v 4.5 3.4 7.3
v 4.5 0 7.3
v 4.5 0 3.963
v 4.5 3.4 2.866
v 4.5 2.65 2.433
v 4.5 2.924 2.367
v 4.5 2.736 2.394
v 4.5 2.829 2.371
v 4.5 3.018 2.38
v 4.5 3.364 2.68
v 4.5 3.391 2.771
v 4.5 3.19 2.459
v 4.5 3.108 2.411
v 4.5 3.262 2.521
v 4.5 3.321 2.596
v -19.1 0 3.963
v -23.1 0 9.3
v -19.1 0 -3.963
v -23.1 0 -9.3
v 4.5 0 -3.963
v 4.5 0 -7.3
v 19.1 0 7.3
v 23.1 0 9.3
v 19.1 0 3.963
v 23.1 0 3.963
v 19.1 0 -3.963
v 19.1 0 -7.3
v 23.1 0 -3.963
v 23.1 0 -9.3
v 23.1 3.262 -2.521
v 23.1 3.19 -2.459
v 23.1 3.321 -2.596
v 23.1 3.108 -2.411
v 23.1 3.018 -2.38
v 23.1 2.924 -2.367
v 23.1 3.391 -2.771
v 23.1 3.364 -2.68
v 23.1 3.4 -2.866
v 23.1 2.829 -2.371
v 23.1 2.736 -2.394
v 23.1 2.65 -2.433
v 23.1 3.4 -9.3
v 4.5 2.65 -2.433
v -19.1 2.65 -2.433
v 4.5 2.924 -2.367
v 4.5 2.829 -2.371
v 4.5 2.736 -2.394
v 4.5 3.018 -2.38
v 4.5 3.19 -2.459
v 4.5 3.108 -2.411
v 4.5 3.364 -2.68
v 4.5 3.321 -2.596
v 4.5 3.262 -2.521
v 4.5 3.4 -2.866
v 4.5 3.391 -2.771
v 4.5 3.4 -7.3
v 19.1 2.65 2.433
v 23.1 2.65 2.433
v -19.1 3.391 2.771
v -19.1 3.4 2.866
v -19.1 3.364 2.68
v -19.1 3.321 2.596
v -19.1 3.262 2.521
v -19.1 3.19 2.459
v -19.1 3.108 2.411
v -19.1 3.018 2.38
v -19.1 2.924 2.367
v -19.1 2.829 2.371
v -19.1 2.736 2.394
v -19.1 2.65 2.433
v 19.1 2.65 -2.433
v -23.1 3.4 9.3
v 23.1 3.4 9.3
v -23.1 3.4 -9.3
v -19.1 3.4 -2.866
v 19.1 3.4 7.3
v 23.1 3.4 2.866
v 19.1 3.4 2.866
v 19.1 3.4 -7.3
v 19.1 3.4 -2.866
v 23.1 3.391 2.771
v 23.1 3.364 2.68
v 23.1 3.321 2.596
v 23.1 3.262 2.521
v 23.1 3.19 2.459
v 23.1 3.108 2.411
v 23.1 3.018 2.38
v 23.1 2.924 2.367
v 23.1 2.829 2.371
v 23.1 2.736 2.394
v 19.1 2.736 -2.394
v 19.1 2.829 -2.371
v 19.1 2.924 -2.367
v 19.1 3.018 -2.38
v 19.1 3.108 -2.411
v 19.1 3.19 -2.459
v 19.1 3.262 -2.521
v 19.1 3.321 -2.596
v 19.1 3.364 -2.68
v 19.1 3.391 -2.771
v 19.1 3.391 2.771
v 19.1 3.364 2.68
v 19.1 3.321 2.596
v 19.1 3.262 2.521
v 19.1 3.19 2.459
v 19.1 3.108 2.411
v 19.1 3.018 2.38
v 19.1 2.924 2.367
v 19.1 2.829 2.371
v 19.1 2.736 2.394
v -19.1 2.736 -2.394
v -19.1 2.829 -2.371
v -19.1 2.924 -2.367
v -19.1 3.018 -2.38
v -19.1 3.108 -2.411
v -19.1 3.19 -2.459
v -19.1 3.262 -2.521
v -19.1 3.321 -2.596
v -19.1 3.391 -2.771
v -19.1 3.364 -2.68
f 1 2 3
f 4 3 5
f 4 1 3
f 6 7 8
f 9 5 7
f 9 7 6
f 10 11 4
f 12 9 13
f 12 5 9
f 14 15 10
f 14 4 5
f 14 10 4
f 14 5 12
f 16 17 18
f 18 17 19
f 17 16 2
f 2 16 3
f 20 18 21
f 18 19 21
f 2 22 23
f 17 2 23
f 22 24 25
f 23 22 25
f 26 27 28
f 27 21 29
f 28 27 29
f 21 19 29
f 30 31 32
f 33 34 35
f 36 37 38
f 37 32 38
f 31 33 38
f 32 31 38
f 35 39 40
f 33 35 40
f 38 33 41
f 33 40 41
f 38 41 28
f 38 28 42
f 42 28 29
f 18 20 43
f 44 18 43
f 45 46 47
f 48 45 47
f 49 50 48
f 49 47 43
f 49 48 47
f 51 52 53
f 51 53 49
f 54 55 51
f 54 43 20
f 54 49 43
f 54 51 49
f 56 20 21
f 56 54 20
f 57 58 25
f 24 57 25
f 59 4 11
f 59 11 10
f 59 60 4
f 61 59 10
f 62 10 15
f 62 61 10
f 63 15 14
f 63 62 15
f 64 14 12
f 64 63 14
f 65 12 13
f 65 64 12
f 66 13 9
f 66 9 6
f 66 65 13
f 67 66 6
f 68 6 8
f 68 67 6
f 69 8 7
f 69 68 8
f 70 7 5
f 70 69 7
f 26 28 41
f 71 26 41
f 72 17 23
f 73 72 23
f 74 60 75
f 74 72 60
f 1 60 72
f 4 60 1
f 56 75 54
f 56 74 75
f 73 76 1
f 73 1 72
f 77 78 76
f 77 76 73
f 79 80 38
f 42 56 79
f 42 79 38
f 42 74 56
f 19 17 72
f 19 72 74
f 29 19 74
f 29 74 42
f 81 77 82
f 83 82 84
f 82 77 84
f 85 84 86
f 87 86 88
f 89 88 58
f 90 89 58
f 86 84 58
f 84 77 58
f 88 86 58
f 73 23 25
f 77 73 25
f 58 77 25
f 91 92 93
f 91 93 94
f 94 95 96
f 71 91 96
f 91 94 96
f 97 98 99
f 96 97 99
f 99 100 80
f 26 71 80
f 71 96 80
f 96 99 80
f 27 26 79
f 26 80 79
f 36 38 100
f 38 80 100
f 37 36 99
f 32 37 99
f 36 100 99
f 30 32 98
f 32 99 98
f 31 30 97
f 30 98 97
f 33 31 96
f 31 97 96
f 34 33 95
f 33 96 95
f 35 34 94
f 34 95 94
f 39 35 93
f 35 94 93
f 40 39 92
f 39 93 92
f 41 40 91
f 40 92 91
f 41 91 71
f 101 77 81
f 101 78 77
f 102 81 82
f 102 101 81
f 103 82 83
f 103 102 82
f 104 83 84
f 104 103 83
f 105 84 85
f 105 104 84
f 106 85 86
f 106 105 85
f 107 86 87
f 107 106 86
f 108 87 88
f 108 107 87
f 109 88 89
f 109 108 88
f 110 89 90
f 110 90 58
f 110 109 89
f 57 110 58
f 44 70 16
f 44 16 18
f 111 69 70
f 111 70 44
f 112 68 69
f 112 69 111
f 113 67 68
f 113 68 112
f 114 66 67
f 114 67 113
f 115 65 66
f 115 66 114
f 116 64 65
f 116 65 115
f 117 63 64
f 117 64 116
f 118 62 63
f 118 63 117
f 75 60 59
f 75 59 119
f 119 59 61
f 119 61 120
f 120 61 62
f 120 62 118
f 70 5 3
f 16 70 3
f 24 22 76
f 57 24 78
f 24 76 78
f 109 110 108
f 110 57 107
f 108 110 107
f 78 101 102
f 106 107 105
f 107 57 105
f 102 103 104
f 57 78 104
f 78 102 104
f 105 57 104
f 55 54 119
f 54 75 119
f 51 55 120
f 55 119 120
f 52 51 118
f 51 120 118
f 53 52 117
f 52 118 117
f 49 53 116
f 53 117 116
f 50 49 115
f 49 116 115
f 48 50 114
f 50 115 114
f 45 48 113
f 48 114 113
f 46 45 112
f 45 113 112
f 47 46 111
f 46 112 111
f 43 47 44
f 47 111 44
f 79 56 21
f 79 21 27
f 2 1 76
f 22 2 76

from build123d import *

# Parameters (mm, degrees)
SKETCH1_W           = 46.2
SKETCH1_H           = 18.6
BOSS_EXTRUDE1_DEPTH = 3.4
CUT_EXTRUDE1_DEPTH  = 42.2
SKETCH3_W           = 14.6
SKETCH3_H           = 14.6
CUT_EXTRUDE2_DEPTH  = 26.132847033
FILLET1_R           = 0.5


with BuildPart() as part:
    # Sketch1 → Boss-Extrude1 (new body)
    with BuildSketch(Plane(origin=(0, 0, 0), x_dir=(1, 0, 0), z_dir=(0, 1, 0))):
        Rectangle(SKETCH1_W, SKETCH1_H)
    extrude(amount=BOSS_EXTRUDE1_DEPTH)

    # Sketch2 → Cut-Extrude1 (cut)
    with BuildSketch(Plane(origin=(23.1, 0, 0), x_dir=(0, 0, -1), z_dir=(1, 0, 0))):
        Polygon((2, 3.4), (-2, 3.4), (-3.962990915, 0), (3.962990915, 0), align=None)
    extrude(amount=-CUT_EXTRUDE1_DEPTH, mode=Mode.SUBTRACT)

    # Sketch3 → Cut-Extrude2 (cut, through all)
    with BuildSketch(Plane(origin=(0, 3.4, 0), x_dir=(1, 0, 0), z_dir=(0, 1, 0))):
        with Locations((11.8, 0)):
            Rectangle(SKETCH3_W, SKETCH3_H)
    extrude(amount=-CUT_EXTRUDE2_DEPTH, mode=Mode.SUBTRACT)

    # Fillet1
    fillet1_edges = [part.edges().sort_by_distance(p)[0] for p in [
        (-7.3, 3.4, 2),
        (-7.3, 3.4, -2),
        (21.1, 3.4, -2),
        (21.1, 3.4, 2),
    ]]
    fillet(fillet1_edges, radius=FILLET1_R)


solid = part.part
